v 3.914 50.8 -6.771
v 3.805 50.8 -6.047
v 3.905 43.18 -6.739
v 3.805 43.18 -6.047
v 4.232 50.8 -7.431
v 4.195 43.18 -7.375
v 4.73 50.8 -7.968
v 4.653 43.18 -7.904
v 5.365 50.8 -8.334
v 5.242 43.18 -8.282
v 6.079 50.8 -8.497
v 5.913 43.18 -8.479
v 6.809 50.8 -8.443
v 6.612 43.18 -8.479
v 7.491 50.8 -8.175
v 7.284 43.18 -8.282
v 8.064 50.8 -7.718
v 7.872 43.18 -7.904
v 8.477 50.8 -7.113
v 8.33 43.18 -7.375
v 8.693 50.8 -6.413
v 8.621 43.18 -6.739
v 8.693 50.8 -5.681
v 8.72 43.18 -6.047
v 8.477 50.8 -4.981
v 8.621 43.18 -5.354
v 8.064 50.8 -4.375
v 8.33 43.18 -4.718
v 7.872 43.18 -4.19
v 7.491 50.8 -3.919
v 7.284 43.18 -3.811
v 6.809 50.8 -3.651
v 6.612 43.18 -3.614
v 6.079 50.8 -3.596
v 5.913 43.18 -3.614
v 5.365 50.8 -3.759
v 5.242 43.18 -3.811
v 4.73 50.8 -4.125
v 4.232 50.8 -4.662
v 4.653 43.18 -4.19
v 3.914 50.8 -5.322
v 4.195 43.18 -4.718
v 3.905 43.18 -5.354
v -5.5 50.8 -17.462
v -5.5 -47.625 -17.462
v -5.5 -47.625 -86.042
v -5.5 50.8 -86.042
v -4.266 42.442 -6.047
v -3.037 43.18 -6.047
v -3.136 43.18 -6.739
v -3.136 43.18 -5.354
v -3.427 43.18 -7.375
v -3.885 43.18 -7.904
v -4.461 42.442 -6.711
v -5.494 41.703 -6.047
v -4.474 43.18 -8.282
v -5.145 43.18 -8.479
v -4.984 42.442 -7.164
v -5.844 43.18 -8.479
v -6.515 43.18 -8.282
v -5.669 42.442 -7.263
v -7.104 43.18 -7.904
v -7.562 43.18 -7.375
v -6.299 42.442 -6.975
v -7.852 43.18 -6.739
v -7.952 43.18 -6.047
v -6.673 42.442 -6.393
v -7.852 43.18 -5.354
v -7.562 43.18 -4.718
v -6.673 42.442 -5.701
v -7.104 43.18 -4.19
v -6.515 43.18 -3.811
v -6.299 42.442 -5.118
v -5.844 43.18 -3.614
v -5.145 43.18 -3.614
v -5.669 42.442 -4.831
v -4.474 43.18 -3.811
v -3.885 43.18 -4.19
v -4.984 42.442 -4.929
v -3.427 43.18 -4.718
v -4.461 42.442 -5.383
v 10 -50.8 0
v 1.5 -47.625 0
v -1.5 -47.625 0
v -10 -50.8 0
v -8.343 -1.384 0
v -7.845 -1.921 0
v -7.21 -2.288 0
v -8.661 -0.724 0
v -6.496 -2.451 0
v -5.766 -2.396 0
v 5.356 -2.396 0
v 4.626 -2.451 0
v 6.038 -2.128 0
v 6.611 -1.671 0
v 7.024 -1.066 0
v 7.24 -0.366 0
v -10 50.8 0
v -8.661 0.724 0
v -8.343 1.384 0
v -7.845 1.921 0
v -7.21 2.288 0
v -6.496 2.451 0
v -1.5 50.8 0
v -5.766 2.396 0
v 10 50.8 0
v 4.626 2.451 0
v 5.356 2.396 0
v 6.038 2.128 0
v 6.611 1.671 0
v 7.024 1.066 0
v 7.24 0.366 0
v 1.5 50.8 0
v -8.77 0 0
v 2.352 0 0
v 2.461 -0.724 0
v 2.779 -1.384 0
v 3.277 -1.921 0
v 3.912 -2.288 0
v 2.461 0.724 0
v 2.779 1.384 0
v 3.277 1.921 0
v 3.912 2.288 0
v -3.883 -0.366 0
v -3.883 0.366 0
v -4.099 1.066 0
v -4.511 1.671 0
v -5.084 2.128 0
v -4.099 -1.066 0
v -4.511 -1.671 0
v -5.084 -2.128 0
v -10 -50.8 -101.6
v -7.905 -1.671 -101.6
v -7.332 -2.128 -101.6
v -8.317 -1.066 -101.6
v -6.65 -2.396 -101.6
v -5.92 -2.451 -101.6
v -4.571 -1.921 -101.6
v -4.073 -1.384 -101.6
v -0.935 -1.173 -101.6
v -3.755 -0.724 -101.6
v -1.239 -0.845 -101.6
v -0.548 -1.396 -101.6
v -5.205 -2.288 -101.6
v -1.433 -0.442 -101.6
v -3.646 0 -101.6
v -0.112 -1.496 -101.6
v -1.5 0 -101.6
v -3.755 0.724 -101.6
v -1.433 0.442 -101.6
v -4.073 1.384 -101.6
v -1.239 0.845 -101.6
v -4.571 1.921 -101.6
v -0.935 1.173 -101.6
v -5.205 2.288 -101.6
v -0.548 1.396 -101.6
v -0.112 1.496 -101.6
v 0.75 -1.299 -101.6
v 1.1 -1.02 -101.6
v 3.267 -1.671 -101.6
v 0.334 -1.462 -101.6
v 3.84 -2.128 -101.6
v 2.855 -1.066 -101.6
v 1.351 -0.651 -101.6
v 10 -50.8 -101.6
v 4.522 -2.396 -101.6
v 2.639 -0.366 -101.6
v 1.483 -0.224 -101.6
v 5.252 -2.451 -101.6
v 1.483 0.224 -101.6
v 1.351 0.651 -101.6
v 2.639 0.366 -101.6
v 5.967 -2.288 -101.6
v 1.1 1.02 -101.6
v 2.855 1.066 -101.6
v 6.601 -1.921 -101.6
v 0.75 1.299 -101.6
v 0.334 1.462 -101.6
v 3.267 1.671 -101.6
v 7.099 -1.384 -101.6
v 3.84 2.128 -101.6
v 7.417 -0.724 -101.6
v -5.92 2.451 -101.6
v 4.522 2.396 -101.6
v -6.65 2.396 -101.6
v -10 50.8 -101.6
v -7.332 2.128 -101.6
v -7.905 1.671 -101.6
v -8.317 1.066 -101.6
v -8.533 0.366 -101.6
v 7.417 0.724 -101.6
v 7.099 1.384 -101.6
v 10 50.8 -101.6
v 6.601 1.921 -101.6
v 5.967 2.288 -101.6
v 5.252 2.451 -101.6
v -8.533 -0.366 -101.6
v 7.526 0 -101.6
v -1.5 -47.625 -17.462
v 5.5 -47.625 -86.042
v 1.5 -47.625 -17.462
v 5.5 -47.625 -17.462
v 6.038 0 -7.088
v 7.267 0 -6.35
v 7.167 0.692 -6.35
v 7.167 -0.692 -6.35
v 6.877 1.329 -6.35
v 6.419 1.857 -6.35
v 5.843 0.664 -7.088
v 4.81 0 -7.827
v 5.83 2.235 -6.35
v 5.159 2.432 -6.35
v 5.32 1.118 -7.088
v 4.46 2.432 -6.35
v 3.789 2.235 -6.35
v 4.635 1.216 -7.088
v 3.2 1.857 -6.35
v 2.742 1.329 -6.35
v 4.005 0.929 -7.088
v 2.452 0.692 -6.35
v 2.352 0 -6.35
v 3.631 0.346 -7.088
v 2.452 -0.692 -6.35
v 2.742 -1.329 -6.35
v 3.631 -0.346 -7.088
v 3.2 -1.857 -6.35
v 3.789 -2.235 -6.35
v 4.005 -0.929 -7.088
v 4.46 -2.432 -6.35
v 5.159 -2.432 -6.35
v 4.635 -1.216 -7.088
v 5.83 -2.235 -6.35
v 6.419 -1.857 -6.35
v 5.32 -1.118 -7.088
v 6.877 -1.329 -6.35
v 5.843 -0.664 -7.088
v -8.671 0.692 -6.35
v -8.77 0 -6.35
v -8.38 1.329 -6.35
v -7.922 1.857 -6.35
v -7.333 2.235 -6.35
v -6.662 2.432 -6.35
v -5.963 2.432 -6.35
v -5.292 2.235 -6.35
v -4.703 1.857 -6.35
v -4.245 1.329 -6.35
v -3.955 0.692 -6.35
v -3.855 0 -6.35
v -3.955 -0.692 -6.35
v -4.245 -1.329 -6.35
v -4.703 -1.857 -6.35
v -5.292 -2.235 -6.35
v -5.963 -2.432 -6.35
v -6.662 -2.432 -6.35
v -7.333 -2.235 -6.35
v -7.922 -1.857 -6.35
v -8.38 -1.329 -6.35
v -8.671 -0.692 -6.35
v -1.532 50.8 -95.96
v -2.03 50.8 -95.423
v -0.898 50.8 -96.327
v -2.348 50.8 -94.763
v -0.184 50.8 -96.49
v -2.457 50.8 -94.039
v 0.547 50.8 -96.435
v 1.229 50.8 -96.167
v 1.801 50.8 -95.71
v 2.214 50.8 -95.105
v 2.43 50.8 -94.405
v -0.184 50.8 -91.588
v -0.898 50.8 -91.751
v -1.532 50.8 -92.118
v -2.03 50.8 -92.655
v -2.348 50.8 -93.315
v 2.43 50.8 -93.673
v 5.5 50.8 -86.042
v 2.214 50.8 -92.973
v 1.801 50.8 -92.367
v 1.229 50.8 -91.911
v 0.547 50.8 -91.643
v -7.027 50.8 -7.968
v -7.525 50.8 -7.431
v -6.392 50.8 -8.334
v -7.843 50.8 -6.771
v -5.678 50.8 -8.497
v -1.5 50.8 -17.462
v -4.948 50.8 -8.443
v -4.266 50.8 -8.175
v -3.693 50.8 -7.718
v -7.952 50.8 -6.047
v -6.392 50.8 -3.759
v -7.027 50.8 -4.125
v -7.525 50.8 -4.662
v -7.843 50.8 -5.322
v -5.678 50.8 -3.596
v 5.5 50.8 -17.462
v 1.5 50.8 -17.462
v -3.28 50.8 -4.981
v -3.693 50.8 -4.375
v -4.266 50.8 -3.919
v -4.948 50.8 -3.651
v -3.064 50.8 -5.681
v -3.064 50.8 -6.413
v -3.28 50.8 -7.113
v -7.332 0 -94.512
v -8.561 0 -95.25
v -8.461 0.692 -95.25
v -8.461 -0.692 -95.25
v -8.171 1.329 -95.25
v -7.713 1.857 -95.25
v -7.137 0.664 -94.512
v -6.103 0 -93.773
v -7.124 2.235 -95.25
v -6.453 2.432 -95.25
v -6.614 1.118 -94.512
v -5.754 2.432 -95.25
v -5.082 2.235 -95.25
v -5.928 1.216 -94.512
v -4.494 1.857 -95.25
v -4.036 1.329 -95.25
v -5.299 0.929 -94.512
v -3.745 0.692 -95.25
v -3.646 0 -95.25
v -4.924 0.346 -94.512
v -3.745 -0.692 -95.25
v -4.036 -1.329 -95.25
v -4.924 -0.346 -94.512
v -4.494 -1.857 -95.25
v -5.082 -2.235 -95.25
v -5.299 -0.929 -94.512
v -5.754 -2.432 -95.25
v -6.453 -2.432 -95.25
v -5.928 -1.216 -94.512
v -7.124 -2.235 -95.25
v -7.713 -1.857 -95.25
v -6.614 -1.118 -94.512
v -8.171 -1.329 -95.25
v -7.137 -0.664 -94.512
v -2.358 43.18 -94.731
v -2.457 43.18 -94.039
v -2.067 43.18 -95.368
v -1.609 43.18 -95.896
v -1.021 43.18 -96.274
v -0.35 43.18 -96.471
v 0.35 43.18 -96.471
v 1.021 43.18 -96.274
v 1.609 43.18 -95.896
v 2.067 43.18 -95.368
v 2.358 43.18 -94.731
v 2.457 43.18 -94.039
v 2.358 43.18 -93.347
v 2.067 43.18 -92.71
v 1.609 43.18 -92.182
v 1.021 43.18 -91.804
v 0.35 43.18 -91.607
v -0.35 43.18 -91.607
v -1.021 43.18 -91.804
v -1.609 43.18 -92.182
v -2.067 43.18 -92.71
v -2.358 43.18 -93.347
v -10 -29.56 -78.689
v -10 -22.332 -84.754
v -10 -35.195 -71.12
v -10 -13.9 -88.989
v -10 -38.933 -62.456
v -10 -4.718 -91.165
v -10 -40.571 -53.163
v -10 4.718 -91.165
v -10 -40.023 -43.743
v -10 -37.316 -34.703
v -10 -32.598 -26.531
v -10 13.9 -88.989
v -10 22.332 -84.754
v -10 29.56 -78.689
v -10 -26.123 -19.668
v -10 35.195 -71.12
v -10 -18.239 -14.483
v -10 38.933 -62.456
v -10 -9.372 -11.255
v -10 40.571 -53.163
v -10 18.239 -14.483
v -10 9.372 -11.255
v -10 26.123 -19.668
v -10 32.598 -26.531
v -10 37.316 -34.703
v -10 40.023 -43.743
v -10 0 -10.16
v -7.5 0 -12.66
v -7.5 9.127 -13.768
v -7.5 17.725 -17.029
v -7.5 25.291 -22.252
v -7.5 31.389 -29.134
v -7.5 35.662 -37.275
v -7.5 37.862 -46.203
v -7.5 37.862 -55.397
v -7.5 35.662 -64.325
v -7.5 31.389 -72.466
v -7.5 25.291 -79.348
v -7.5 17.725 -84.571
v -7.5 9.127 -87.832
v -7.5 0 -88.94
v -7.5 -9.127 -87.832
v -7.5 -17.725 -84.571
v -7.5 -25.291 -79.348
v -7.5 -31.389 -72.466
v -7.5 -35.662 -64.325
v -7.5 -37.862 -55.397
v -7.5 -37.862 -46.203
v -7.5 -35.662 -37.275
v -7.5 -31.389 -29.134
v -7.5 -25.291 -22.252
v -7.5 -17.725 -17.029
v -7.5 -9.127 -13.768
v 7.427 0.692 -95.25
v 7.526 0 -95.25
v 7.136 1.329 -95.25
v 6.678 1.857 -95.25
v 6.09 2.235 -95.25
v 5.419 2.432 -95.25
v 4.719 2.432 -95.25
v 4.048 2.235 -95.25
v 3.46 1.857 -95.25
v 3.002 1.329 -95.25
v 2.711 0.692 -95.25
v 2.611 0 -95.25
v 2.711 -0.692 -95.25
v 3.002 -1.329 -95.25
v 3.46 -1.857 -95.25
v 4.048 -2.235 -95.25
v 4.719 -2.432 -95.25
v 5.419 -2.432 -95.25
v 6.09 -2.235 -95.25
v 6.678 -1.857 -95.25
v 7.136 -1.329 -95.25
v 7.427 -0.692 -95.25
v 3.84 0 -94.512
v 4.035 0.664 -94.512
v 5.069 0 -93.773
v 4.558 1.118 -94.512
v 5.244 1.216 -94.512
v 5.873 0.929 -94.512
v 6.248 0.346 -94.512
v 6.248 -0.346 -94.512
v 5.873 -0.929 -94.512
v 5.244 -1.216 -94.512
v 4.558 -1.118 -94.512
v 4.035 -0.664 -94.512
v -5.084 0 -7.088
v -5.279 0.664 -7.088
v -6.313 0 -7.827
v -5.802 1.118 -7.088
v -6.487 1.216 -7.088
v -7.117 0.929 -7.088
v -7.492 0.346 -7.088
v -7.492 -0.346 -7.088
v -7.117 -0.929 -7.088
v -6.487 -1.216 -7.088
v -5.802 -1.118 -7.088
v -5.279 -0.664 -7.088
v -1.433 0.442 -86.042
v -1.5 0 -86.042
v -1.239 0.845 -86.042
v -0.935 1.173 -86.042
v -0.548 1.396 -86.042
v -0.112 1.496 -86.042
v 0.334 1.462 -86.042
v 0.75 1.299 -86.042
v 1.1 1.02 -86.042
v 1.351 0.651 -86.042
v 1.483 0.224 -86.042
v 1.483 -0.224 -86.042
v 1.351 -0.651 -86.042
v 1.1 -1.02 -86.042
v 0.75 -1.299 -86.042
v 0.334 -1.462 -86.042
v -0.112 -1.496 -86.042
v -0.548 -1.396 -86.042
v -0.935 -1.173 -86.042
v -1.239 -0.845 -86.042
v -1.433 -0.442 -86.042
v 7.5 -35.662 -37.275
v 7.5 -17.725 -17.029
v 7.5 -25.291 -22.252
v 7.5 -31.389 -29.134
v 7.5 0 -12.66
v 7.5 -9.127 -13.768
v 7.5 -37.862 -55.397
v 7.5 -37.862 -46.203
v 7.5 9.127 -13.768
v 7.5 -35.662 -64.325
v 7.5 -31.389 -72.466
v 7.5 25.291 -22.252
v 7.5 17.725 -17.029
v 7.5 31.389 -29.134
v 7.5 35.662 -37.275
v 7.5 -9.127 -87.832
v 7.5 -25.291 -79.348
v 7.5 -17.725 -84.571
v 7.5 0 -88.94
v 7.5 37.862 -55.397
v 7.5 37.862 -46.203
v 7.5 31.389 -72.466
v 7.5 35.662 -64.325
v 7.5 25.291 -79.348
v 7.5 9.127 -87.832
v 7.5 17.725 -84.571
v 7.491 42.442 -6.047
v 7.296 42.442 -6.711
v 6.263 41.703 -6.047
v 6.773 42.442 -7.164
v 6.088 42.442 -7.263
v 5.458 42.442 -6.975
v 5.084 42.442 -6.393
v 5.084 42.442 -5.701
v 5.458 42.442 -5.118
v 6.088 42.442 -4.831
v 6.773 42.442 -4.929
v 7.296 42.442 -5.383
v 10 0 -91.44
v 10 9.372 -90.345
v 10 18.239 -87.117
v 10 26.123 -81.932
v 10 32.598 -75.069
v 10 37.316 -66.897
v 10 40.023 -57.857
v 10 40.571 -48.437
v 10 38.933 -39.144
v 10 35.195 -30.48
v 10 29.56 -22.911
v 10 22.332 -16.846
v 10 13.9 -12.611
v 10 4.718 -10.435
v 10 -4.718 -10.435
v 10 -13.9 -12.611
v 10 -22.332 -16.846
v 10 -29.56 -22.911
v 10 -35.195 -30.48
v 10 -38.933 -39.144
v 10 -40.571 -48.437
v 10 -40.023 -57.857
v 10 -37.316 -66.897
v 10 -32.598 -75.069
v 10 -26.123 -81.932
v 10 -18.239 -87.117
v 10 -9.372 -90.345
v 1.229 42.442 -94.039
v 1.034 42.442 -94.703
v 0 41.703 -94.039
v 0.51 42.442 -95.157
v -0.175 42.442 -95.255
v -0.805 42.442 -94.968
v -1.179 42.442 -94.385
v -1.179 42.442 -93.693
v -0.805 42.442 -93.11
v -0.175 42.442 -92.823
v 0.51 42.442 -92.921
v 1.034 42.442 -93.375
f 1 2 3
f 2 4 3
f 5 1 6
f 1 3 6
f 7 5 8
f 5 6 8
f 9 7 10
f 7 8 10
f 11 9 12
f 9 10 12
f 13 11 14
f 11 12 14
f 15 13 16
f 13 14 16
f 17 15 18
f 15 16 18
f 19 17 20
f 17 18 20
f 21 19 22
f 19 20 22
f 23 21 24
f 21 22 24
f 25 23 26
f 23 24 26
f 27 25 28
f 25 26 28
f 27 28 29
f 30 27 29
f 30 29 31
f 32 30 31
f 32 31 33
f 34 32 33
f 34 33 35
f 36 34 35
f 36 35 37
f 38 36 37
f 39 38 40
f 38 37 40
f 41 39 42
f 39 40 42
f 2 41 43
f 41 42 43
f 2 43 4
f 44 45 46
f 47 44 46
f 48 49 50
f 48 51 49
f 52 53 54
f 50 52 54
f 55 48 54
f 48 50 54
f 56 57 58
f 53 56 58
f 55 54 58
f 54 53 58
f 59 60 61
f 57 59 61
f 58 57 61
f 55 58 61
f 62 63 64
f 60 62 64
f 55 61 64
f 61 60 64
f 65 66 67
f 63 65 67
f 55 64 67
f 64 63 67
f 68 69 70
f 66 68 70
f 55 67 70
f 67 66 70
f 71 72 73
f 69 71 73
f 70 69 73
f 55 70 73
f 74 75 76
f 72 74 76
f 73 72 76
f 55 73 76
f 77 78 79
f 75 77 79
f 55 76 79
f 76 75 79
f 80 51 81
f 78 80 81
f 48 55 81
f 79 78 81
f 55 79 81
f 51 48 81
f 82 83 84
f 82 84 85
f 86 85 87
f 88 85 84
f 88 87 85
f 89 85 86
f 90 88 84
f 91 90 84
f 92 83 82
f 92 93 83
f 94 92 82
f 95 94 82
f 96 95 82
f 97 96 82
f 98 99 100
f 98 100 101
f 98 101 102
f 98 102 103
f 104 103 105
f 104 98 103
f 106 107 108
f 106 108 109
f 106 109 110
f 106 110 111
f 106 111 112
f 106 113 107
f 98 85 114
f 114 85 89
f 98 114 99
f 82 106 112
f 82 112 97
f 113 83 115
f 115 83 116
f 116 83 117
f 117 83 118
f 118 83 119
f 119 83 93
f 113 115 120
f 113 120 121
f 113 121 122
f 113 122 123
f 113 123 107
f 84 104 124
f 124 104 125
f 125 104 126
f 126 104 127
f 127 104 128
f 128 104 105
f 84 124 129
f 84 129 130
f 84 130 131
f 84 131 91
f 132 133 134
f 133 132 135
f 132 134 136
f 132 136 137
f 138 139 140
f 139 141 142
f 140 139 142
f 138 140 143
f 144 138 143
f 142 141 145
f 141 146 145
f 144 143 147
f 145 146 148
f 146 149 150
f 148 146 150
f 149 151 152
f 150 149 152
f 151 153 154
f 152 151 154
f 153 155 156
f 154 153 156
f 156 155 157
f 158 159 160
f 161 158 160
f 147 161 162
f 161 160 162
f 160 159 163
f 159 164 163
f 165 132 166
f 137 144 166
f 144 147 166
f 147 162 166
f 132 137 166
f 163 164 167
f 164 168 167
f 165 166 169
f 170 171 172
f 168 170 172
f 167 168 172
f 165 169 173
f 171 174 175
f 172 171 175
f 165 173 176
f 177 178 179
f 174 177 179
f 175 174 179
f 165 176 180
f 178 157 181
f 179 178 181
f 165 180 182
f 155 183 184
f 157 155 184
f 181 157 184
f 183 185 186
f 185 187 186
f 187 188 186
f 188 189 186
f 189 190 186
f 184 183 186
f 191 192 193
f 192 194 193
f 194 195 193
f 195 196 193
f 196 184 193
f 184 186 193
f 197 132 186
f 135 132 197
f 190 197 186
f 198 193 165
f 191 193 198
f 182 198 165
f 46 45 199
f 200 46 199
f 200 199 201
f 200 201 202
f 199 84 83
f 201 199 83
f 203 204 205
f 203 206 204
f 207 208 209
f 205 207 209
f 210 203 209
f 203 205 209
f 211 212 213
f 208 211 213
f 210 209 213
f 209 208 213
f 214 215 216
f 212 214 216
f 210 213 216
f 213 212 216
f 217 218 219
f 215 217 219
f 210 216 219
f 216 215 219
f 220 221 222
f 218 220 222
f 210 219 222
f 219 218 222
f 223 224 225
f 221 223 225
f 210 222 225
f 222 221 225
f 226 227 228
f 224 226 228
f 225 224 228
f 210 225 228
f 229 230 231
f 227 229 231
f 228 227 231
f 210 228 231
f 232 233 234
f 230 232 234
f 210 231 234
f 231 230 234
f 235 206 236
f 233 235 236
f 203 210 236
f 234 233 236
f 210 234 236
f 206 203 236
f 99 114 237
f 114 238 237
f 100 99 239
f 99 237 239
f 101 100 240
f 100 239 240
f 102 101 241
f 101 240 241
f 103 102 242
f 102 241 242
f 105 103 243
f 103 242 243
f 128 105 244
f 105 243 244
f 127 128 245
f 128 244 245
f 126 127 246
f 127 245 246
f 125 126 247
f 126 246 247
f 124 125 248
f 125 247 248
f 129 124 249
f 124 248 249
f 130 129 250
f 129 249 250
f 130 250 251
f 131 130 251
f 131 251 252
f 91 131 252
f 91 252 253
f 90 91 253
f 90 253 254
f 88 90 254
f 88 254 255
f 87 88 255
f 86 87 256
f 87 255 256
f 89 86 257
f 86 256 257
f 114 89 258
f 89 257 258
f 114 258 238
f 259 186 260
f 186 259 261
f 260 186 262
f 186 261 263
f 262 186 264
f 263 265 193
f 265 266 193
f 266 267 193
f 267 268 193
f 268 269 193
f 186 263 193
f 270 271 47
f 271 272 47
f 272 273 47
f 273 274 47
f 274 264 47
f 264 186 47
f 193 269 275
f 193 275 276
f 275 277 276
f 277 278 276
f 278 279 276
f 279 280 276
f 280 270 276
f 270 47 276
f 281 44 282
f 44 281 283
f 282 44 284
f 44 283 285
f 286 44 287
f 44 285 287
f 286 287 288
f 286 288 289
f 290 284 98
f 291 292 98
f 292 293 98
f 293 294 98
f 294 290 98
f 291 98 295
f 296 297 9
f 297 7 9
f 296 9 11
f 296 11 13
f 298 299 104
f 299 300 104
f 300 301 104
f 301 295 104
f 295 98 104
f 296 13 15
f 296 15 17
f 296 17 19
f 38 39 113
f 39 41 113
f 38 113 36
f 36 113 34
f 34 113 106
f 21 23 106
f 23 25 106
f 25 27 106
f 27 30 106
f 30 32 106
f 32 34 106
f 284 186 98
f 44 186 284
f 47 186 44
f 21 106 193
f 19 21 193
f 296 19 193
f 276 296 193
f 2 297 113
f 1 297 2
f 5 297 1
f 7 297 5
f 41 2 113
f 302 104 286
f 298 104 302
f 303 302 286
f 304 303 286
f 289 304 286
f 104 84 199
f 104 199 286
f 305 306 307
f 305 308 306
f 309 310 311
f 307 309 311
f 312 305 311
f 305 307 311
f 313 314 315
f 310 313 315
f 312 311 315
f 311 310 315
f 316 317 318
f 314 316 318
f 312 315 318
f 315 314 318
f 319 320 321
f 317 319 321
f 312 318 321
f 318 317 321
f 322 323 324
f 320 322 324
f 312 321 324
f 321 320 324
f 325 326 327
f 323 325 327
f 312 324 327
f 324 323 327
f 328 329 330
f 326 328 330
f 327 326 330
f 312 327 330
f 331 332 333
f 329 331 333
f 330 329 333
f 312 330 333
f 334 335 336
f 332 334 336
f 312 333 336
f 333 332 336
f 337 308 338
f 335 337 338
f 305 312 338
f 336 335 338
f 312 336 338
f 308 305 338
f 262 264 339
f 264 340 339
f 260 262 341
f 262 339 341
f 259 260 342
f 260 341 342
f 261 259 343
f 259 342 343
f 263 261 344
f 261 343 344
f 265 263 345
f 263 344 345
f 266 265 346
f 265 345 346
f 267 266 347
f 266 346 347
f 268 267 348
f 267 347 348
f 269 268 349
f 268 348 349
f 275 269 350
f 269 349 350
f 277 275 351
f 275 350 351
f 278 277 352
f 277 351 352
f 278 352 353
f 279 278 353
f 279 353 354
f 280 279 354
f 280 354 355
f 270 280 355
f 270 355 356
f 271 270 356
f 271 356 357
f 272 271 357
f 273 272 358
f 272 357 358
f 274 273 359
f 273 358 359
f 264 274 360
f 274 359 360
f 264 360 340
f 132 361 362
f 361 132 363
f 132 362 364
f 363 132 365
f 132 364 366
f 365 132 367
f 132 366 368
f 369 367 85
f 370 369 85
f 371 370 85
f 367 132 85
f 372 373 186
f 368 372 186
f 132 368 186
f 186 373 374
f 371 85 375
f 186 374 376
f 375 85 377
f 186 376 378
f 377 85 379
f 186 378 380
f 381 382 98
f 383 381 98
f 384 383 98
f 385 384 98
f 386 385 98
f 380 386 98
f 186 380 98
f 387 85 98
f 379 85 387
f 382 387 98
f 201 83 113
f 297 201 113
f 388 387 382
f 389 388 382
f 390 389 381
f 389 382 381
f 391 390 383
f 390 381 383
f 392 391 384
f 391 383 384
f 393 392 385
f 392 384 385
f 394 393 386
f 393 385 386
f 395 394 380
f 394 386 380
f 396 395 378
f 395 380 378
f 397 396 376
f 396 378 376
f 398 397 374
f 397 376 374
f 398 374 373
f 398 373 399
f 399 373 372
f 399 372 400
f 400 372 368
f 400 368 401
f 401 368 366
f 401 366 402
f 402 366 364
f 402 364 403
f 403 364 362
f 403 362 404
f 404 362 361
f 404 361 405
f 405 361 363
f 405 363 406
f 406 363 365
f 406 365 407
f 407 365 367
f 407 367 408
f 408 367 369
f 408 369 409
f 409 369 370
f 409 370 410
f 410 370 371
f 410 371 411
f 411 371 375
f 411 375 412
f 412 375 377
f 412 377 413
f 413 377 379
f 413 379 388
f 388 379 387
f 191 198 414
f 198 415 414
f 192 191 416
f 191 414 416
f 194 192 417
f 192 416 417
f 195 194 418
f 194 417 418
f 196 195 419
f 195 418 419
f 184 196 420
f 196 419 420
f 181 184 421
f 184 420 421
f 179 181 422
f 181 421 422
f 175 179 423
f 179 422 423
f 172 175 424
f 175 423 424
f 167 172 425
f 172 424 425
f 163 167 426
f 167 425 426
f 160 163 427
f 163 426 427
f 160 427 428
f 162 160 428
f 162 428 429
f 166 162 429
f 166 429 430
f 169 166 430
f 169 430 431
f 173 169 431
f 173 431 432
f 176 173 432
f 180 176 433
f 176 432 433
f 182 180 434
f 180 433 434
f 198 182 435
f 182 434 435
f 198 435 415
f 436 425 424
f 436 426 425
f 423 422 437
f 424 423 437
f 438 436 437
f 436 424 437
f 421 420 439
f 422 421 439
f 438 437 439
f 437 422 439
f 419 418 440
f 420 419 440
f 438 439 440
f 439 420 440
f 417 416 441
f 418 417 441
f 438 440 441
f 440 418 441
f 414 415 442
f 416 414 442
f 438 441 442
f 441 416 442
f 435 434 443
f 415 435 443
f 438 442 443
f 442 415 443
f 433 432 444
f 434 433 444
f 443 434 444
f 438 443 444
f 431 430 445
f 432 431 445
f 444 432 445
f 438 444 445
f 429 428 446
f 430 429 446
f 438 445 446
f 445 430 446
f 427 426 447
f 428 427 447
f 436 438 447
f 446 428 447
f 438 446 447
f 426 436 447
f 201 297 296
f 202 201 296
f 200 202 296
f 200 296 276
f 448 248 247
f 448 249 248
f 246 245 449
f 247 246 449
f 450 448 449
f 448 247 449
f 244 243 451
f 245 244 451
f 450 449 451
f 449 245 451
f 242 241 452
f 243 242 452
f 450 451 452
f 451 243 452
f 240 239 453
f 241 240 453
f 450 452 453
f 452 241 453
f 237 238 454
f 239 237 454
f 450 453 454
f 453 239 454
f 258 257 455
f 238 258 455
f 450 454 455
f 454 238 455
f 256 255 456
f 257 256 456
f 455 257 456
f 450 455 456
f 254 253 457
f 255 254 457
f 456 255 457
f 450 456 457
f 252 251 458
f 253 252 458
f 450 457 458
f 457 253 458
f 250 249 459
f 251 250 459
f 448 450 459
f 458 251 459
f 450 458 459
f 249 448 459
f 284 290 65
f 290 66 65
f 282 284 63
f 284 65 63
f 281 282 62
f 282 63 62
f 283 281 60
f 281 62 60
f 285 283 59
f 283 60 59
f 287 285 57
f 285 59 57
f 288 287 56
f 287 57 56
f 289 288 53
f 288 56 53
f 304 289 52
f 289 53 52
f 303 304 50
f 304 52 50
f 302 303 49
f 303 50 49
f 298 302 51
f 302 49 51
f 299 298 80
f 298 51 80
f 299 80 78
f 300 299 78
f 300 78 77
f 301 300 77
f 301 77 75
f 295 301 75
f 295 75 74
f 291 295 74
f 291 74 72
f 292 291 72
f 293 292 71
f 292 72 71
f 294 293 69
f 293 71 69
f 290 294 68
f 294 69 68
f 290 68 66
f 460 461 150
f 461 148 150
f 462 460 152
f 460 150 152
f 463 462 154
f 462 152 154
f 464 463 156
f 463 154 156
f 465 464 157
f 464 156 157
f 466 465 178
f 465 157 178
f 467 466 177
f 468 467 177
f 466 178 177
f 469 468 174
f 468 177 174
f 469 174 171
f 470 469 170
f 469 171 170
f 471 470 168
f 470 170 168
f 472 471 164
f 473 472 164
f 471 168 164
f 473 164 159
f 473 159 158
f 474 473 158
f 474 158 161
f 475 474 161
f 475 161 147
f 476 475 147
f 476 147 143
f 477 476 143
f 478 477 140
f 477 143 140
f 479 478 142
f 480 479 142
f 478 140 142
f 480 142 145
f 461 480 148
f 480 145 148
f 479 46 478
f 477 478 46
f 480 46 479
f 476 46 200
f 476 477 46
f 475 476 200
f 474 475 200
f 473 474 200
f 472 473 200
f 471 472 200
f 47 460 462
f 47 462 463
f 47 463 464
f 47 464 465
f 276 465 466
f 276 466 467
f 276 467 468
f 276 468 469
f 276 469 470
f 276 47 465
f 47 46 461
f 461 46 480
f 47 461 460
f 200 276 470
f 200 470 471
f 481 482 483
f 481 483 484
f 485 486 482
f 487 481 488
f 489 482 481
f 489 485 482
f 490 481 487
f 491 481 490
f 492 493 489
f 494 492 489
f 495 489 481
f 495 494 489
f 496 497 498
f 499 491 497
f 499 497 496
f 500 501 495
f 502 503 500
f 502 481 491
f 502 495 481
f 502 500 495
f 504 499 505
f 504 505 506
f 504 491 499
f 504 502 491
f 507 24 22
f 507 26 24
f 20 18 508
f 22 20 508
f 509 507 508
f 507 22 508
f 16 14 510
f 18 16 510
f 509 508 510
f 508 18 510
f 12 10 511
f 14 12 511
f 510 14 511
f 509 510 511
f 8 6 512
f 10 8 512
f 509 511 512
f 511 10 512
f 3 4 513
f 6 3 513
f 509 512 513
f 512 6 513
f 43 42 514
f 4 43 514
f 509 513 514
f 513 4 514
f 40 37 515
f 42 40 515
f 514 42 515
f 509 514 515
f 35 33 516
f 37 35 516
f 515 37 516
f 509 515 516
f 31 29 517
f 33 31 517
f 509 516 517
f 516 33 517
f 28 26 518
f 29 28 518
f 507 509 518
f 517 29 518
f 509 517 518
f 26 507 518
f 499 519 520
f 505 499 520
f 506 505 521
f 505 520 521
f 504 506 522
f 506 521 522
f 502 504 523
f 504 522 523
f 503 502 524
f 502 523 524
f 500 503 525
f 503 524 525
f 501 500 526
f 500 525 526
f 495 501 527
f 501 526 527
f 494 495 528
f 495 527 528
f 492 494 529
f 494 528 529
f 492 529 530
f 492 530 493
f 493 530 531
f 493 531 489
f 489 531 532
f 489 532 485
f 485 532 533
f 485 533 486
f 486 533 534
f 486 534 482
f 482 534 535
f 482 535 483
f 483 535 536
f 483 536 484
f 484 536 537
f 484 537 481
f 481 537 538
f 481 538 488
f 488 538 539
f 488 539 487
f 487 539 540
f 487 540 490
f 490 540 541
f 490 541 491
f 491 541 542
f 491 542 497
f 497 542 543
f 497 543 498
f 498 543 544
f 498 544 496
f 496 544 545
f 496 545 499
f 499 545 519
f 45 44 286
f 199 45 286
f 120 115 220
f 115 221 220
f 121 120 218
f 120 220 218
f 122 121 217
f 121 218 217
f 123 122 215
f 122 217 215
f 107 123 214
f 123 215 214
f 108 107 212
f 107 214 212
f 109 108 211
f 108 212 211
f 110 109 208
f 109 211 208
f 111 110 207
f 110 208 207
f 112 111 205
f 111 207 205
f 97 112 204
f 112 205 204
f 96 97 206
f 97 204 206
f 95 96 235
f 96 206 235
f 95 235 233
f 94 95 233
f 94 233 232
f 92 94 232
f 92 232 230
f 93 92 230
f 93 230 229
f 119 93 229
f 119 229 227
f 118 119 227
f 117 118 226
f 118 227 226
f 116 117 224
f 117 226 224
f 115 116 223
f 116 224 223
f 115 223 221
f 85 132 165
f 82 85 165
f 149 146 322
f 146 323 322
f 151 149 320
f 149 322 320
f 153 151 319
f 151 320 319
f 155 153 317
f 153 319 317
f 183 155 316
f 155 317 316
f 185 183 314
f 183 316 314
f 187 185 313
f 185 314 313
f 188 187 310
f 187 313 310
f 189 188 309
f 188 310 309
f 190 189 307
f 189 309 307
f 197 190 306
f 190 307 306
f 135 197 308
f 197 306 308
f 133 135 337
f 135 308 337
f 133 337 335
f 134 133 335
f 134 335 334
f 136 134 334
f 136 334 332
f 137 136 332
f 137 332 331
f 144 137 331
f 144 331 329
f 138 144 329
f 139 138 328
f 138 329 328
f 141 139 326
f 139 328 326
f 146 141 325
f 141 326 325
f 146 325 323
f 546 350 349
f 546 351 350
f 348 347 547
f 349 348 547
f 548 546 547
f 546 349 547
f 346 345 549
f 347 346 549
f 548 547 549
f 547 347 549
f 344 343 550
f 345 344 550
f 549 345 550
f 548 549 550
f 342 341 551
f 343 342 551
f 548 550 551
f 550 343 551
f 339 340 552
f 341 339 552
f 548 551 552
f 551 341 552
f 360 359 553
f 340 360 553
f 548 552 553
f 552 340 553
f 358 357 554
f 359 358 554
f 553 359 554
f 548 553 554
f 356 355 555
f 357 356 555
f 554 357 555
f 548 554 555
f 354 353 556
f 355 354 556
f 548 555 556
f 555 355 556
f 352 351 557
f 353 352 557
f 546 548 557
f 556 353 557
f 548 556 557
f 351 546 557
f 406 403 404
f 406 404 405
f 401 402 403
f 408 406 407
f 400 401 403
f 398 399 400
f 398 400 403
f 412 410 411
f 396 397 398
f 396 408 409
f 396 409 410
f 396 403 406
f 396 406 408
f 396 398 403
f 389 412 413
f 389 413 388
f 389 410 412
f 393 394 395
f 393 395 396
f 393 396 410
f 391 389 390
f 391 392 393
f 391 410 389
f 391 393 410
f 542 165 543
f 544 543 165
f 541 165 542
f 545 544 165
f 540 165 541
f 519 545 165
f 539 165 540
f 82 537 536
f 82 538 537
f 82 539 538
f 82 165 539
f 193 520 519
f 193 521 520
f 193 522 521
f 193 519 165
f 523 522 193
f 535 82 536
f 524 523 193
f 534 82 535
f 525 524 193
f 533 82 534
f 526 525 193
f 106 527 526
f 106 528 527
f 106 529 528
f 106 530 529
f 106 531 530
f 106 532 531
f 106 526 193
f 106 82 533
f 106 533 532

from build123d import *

# Parameters (mm, degrees)
SKETCH1_W                        = 20
SKETCH1_H                        = 101.6
BOSS_EXTRUDE1_DEPTH              = 101.6
SKETCH3_W                        = 11
SKETCH3_H                        = 68.58
CUT_EXTRUDE1_DEPTH               = 98.425
CUT_EXTRUDE2_REACH               = 116.032
SKETCH4_W                        = 3
SKETCH4_H                        = 98.425
SKETCH5_R                        = 40.64
CUT_EXTRUDE3_DEPTH               = 2.5
CUT_EXTRUDE3_DRAFT               = -45
SKETCH6_R                        = 40.64
CUT_EXTRUDE4_DEPTH               = 2.5
CUT_EXTRUDE4_DRAFT               = -45
F_10_0_1935_DIAMETER_HOLE1_D     = 4.9149
F_10_0_1935_DIAMETER_HOLE1_DEPTH = 7.62
F_10_0_1935_DIAMETER_HOLE1_TIP   = 1.476584928
CUT_EXTRUDE5_REACH               = 116.032
SKETCH9_R                        = 1.5
F_10_0_1935_DIAMETER_HOLE2_D     = 4.9149
F_10_0_1935_DIAMETER_HOLE2_DEPTH = 6.35
F_10_0_1935_DIAMETER_HOLE2_TIP   = 1.476584928
F_10_0_1935_DIAMETER_HOLE3_D     = 4.9149
F_10_0_1935_DIAMETER_HOLE3_DEPTH = 6.35
F_10_0_1935_DIAMETER_HOLE3_TIP   = 1.476584928


with BuildPart() as part:
    # Sketch1 → Boss-Extrude1 (new body)
    with BuildSketch(Plane.XY):
        Rectangle(SKETCH1_W, SKETCH1_H)
    extrude(amount=-BOSS_EXTRUDE1_DEPTH)

    # Sketch3 → Cut-Extrude1 (cut)
    with BuildSketch(Plane(origin=(0, 50.8, 0), x_dir=(1, 0, 0), z_dir=(0, 1, 0))):
        with Locations((0, 51.7525)):
            Rectangle(SKETCH3_W, SKETCH3_H)
    extrude(amount=-CUT_EXTRUDE1_DEPTH, mode=Mode.SUBTRACT)

    # Sketch4 → Cut-Extrude2 (cut, up to next)
    with BuildSketch(Plane.XY, mode=Mode.PRIVATE) as cut_extrude2_sk1:
        with Locations((0, 1.5875)):
            Rectangle(SKETCH4_W, SKETCH4_H)
    cut_extrude2_tool1 = extrude(cut_extrude2_sk1.sketch, amount=-CUT_EXTRUDE2_REACH, mode=Mode.PRIVATE) & part.part
    add(cut_extrude2_tool1.solids().sort_by_distance((0, 1.5875, 0))[0], mode=Mode.SUBTRACT)


with BuildPart() as cut_extrude3_tool:
    # Sketch5 → Cut-Extrude3 (with draft: the straight prism first)
    with BuildSketch(Plane(origin=(10, 0, 0), x_dir=(0, 0, -1), z_dir=(1, 0, 0))):
        with Locations((50.8, 0)):
            Circle(SKETCH5_R)
    extrude(amount=-CUT_EXTRUDE3_DEPTH)
    # Cut-Extrude3: the draft: its side faces are tilted about the plane it starts from
    cut_extrude3_sides = [cut_extrude3_tool.faces().sort_by_distance(p)[0] for p in [
        (8.75, 0, -10.16),
    ]]
    draft(cut_extrude3_sides, Plane(origin=(10, 0, 0), x_dir=(0, 0, -1), z_dir=(1, 0, 0)), CUT_EXTRUDE3_DRAFT)


with BuildPart() as part_1:
    add(part.part)

    # Cut-Extrude3: cut by cut_extrude3_tool
    add(cut_extrude3_tool.part, mode=Mode.SUBTRACT)


with BuildPart() as cut_extrude4_tool:
    # Sketch6 → Cut-Extrude4 (with draft: the straight prism first)
    with BuildSketch(Plane.ZY.offset(10)):
        with Locations((-50.8, 0)):
            Circle(SKETCH6_R)
    extrude(amount=-CUT_EXTRUDE4_DEPTH)
    # Cut-Extrude4: the draft: its side faces are tilted about the plane it starts from
    cut_extrude4_sides = [cut_extrude4_tool.faces().sort_by_distance(p)[0] for p in [
        (-8.75, 0, -91.44),
    ]]
    draft(cut_extrude4_sides, Plane.ZY.offset(10), CUT_EXTRUDE4_DRAFT)


with BuildPart() as part_2:
    add(part_1.part)

    # Cut-Extrude4: cut by cut_extrude4_tool
    add(cut_extrude4_tool.part, mode=Mode.SUBTRACT)

    # #10 (0.1935) Diameter Hole1
    with Locations(Plane(origin=(0, 50.8, 0), x_dir=(1, 0, 0), z_dir=(0, 1, 0))):
        with Locations((-5.494388528, 6.046802712), (6.262656147, 6.046802712), (0, 94.038956273)):
            Hole(F_10_0_1935_DIAMETER_HOLE1_D / 2, depth=F_10_0_1935_DIAMETER_HOLE1_DEPTH)
            with Locations((0, 0, -(F_10_0_1935_DIAMETER_HOLE1_DEPTH + F_10_0_1935_DIAMETER_HOLE1_TIP / 2))):  # 118° drill point
                Cone(0, F_10_0_1935_DIAMETER_HOLE1_D / 2, F_10_0_1935_DIAMETER_HOLE1_TIP, mode=Mode.SUBTRACT)

    # Sketch9 → Cut-Extrude5 (cut, up to next)
    with BuildSketch(Plane(origin=(0, 0, -101.6), x_dir=(-1, 0, 0), z_dir=(0, 0, -1)), mode=Mode.PRIVATE) as cut_extrude5_sk1:
        Circle(SKETCH9_R)
    cut_extrude5_tool1 = extrude(cut_extrude5_sk1.sketch, amount=-CUT_EXTRUDE5_REACH, mode=Mode.PRIVATE) & part_2.part
    add(cut_extrude5_tool1.solids().sort_by_distance((0, 0, -101.6))[0], mode=Mode.SUBTRACT)

    # #10 (0.1935) Diameter Hole2
    with Locations(Plane.XY):
        with Locations((4.80953422, 0), (-6.312598241, 0)):
            Hole(F_10_0_1935_DIAMETER_HOLE2_D / 2, depth=F_10_0_1935_DIAMETER_HOLE2_DEPTH)
            with Locations((0, 0, -(F_10_0_1935_DIAMETER_HOLE2_DEPTH + F_10_0_1935_DIAMETER_HOLE2_TIP / 2))):  # 118° drill point
                Cone(0, F_10_0_1935_DIAMETER_HOLE2_D / 2, F_10_0_1935_DIAMETER_HOLE2_TIP, mode=Mode.SUBTRACT)

    # #10 (0.1935) Diameter Hole3
    with Locations(Plane(origin=(0, 0, -101.6), x_dir=(-1, 0, 0), z_dir=(0, 0, -1))):
        with Locations((6.103302253, 0), (-5.068844244, 0)):
            Hole(F_10_0_1935_DIAMETER_HOLE3_D / 2, depth=F_10_0_1935_DIAMETER_HOLE3_DEPTH)
            with Locations((0, 0, -(F_10_0_1935_DIAMETER_HOLE3_DEPTH + F_10_0_1935_DIAMETER_HOLE3_TIP / 2))):  # 118° drill point
                Cone(0, F_10_0_1935_DIAMETER_HOLE3_D / 2, F_10_0_1935_DIAMETER_HOLE3_TIP, mode=Mode.SUBTRACT)


solid = part_2.part
